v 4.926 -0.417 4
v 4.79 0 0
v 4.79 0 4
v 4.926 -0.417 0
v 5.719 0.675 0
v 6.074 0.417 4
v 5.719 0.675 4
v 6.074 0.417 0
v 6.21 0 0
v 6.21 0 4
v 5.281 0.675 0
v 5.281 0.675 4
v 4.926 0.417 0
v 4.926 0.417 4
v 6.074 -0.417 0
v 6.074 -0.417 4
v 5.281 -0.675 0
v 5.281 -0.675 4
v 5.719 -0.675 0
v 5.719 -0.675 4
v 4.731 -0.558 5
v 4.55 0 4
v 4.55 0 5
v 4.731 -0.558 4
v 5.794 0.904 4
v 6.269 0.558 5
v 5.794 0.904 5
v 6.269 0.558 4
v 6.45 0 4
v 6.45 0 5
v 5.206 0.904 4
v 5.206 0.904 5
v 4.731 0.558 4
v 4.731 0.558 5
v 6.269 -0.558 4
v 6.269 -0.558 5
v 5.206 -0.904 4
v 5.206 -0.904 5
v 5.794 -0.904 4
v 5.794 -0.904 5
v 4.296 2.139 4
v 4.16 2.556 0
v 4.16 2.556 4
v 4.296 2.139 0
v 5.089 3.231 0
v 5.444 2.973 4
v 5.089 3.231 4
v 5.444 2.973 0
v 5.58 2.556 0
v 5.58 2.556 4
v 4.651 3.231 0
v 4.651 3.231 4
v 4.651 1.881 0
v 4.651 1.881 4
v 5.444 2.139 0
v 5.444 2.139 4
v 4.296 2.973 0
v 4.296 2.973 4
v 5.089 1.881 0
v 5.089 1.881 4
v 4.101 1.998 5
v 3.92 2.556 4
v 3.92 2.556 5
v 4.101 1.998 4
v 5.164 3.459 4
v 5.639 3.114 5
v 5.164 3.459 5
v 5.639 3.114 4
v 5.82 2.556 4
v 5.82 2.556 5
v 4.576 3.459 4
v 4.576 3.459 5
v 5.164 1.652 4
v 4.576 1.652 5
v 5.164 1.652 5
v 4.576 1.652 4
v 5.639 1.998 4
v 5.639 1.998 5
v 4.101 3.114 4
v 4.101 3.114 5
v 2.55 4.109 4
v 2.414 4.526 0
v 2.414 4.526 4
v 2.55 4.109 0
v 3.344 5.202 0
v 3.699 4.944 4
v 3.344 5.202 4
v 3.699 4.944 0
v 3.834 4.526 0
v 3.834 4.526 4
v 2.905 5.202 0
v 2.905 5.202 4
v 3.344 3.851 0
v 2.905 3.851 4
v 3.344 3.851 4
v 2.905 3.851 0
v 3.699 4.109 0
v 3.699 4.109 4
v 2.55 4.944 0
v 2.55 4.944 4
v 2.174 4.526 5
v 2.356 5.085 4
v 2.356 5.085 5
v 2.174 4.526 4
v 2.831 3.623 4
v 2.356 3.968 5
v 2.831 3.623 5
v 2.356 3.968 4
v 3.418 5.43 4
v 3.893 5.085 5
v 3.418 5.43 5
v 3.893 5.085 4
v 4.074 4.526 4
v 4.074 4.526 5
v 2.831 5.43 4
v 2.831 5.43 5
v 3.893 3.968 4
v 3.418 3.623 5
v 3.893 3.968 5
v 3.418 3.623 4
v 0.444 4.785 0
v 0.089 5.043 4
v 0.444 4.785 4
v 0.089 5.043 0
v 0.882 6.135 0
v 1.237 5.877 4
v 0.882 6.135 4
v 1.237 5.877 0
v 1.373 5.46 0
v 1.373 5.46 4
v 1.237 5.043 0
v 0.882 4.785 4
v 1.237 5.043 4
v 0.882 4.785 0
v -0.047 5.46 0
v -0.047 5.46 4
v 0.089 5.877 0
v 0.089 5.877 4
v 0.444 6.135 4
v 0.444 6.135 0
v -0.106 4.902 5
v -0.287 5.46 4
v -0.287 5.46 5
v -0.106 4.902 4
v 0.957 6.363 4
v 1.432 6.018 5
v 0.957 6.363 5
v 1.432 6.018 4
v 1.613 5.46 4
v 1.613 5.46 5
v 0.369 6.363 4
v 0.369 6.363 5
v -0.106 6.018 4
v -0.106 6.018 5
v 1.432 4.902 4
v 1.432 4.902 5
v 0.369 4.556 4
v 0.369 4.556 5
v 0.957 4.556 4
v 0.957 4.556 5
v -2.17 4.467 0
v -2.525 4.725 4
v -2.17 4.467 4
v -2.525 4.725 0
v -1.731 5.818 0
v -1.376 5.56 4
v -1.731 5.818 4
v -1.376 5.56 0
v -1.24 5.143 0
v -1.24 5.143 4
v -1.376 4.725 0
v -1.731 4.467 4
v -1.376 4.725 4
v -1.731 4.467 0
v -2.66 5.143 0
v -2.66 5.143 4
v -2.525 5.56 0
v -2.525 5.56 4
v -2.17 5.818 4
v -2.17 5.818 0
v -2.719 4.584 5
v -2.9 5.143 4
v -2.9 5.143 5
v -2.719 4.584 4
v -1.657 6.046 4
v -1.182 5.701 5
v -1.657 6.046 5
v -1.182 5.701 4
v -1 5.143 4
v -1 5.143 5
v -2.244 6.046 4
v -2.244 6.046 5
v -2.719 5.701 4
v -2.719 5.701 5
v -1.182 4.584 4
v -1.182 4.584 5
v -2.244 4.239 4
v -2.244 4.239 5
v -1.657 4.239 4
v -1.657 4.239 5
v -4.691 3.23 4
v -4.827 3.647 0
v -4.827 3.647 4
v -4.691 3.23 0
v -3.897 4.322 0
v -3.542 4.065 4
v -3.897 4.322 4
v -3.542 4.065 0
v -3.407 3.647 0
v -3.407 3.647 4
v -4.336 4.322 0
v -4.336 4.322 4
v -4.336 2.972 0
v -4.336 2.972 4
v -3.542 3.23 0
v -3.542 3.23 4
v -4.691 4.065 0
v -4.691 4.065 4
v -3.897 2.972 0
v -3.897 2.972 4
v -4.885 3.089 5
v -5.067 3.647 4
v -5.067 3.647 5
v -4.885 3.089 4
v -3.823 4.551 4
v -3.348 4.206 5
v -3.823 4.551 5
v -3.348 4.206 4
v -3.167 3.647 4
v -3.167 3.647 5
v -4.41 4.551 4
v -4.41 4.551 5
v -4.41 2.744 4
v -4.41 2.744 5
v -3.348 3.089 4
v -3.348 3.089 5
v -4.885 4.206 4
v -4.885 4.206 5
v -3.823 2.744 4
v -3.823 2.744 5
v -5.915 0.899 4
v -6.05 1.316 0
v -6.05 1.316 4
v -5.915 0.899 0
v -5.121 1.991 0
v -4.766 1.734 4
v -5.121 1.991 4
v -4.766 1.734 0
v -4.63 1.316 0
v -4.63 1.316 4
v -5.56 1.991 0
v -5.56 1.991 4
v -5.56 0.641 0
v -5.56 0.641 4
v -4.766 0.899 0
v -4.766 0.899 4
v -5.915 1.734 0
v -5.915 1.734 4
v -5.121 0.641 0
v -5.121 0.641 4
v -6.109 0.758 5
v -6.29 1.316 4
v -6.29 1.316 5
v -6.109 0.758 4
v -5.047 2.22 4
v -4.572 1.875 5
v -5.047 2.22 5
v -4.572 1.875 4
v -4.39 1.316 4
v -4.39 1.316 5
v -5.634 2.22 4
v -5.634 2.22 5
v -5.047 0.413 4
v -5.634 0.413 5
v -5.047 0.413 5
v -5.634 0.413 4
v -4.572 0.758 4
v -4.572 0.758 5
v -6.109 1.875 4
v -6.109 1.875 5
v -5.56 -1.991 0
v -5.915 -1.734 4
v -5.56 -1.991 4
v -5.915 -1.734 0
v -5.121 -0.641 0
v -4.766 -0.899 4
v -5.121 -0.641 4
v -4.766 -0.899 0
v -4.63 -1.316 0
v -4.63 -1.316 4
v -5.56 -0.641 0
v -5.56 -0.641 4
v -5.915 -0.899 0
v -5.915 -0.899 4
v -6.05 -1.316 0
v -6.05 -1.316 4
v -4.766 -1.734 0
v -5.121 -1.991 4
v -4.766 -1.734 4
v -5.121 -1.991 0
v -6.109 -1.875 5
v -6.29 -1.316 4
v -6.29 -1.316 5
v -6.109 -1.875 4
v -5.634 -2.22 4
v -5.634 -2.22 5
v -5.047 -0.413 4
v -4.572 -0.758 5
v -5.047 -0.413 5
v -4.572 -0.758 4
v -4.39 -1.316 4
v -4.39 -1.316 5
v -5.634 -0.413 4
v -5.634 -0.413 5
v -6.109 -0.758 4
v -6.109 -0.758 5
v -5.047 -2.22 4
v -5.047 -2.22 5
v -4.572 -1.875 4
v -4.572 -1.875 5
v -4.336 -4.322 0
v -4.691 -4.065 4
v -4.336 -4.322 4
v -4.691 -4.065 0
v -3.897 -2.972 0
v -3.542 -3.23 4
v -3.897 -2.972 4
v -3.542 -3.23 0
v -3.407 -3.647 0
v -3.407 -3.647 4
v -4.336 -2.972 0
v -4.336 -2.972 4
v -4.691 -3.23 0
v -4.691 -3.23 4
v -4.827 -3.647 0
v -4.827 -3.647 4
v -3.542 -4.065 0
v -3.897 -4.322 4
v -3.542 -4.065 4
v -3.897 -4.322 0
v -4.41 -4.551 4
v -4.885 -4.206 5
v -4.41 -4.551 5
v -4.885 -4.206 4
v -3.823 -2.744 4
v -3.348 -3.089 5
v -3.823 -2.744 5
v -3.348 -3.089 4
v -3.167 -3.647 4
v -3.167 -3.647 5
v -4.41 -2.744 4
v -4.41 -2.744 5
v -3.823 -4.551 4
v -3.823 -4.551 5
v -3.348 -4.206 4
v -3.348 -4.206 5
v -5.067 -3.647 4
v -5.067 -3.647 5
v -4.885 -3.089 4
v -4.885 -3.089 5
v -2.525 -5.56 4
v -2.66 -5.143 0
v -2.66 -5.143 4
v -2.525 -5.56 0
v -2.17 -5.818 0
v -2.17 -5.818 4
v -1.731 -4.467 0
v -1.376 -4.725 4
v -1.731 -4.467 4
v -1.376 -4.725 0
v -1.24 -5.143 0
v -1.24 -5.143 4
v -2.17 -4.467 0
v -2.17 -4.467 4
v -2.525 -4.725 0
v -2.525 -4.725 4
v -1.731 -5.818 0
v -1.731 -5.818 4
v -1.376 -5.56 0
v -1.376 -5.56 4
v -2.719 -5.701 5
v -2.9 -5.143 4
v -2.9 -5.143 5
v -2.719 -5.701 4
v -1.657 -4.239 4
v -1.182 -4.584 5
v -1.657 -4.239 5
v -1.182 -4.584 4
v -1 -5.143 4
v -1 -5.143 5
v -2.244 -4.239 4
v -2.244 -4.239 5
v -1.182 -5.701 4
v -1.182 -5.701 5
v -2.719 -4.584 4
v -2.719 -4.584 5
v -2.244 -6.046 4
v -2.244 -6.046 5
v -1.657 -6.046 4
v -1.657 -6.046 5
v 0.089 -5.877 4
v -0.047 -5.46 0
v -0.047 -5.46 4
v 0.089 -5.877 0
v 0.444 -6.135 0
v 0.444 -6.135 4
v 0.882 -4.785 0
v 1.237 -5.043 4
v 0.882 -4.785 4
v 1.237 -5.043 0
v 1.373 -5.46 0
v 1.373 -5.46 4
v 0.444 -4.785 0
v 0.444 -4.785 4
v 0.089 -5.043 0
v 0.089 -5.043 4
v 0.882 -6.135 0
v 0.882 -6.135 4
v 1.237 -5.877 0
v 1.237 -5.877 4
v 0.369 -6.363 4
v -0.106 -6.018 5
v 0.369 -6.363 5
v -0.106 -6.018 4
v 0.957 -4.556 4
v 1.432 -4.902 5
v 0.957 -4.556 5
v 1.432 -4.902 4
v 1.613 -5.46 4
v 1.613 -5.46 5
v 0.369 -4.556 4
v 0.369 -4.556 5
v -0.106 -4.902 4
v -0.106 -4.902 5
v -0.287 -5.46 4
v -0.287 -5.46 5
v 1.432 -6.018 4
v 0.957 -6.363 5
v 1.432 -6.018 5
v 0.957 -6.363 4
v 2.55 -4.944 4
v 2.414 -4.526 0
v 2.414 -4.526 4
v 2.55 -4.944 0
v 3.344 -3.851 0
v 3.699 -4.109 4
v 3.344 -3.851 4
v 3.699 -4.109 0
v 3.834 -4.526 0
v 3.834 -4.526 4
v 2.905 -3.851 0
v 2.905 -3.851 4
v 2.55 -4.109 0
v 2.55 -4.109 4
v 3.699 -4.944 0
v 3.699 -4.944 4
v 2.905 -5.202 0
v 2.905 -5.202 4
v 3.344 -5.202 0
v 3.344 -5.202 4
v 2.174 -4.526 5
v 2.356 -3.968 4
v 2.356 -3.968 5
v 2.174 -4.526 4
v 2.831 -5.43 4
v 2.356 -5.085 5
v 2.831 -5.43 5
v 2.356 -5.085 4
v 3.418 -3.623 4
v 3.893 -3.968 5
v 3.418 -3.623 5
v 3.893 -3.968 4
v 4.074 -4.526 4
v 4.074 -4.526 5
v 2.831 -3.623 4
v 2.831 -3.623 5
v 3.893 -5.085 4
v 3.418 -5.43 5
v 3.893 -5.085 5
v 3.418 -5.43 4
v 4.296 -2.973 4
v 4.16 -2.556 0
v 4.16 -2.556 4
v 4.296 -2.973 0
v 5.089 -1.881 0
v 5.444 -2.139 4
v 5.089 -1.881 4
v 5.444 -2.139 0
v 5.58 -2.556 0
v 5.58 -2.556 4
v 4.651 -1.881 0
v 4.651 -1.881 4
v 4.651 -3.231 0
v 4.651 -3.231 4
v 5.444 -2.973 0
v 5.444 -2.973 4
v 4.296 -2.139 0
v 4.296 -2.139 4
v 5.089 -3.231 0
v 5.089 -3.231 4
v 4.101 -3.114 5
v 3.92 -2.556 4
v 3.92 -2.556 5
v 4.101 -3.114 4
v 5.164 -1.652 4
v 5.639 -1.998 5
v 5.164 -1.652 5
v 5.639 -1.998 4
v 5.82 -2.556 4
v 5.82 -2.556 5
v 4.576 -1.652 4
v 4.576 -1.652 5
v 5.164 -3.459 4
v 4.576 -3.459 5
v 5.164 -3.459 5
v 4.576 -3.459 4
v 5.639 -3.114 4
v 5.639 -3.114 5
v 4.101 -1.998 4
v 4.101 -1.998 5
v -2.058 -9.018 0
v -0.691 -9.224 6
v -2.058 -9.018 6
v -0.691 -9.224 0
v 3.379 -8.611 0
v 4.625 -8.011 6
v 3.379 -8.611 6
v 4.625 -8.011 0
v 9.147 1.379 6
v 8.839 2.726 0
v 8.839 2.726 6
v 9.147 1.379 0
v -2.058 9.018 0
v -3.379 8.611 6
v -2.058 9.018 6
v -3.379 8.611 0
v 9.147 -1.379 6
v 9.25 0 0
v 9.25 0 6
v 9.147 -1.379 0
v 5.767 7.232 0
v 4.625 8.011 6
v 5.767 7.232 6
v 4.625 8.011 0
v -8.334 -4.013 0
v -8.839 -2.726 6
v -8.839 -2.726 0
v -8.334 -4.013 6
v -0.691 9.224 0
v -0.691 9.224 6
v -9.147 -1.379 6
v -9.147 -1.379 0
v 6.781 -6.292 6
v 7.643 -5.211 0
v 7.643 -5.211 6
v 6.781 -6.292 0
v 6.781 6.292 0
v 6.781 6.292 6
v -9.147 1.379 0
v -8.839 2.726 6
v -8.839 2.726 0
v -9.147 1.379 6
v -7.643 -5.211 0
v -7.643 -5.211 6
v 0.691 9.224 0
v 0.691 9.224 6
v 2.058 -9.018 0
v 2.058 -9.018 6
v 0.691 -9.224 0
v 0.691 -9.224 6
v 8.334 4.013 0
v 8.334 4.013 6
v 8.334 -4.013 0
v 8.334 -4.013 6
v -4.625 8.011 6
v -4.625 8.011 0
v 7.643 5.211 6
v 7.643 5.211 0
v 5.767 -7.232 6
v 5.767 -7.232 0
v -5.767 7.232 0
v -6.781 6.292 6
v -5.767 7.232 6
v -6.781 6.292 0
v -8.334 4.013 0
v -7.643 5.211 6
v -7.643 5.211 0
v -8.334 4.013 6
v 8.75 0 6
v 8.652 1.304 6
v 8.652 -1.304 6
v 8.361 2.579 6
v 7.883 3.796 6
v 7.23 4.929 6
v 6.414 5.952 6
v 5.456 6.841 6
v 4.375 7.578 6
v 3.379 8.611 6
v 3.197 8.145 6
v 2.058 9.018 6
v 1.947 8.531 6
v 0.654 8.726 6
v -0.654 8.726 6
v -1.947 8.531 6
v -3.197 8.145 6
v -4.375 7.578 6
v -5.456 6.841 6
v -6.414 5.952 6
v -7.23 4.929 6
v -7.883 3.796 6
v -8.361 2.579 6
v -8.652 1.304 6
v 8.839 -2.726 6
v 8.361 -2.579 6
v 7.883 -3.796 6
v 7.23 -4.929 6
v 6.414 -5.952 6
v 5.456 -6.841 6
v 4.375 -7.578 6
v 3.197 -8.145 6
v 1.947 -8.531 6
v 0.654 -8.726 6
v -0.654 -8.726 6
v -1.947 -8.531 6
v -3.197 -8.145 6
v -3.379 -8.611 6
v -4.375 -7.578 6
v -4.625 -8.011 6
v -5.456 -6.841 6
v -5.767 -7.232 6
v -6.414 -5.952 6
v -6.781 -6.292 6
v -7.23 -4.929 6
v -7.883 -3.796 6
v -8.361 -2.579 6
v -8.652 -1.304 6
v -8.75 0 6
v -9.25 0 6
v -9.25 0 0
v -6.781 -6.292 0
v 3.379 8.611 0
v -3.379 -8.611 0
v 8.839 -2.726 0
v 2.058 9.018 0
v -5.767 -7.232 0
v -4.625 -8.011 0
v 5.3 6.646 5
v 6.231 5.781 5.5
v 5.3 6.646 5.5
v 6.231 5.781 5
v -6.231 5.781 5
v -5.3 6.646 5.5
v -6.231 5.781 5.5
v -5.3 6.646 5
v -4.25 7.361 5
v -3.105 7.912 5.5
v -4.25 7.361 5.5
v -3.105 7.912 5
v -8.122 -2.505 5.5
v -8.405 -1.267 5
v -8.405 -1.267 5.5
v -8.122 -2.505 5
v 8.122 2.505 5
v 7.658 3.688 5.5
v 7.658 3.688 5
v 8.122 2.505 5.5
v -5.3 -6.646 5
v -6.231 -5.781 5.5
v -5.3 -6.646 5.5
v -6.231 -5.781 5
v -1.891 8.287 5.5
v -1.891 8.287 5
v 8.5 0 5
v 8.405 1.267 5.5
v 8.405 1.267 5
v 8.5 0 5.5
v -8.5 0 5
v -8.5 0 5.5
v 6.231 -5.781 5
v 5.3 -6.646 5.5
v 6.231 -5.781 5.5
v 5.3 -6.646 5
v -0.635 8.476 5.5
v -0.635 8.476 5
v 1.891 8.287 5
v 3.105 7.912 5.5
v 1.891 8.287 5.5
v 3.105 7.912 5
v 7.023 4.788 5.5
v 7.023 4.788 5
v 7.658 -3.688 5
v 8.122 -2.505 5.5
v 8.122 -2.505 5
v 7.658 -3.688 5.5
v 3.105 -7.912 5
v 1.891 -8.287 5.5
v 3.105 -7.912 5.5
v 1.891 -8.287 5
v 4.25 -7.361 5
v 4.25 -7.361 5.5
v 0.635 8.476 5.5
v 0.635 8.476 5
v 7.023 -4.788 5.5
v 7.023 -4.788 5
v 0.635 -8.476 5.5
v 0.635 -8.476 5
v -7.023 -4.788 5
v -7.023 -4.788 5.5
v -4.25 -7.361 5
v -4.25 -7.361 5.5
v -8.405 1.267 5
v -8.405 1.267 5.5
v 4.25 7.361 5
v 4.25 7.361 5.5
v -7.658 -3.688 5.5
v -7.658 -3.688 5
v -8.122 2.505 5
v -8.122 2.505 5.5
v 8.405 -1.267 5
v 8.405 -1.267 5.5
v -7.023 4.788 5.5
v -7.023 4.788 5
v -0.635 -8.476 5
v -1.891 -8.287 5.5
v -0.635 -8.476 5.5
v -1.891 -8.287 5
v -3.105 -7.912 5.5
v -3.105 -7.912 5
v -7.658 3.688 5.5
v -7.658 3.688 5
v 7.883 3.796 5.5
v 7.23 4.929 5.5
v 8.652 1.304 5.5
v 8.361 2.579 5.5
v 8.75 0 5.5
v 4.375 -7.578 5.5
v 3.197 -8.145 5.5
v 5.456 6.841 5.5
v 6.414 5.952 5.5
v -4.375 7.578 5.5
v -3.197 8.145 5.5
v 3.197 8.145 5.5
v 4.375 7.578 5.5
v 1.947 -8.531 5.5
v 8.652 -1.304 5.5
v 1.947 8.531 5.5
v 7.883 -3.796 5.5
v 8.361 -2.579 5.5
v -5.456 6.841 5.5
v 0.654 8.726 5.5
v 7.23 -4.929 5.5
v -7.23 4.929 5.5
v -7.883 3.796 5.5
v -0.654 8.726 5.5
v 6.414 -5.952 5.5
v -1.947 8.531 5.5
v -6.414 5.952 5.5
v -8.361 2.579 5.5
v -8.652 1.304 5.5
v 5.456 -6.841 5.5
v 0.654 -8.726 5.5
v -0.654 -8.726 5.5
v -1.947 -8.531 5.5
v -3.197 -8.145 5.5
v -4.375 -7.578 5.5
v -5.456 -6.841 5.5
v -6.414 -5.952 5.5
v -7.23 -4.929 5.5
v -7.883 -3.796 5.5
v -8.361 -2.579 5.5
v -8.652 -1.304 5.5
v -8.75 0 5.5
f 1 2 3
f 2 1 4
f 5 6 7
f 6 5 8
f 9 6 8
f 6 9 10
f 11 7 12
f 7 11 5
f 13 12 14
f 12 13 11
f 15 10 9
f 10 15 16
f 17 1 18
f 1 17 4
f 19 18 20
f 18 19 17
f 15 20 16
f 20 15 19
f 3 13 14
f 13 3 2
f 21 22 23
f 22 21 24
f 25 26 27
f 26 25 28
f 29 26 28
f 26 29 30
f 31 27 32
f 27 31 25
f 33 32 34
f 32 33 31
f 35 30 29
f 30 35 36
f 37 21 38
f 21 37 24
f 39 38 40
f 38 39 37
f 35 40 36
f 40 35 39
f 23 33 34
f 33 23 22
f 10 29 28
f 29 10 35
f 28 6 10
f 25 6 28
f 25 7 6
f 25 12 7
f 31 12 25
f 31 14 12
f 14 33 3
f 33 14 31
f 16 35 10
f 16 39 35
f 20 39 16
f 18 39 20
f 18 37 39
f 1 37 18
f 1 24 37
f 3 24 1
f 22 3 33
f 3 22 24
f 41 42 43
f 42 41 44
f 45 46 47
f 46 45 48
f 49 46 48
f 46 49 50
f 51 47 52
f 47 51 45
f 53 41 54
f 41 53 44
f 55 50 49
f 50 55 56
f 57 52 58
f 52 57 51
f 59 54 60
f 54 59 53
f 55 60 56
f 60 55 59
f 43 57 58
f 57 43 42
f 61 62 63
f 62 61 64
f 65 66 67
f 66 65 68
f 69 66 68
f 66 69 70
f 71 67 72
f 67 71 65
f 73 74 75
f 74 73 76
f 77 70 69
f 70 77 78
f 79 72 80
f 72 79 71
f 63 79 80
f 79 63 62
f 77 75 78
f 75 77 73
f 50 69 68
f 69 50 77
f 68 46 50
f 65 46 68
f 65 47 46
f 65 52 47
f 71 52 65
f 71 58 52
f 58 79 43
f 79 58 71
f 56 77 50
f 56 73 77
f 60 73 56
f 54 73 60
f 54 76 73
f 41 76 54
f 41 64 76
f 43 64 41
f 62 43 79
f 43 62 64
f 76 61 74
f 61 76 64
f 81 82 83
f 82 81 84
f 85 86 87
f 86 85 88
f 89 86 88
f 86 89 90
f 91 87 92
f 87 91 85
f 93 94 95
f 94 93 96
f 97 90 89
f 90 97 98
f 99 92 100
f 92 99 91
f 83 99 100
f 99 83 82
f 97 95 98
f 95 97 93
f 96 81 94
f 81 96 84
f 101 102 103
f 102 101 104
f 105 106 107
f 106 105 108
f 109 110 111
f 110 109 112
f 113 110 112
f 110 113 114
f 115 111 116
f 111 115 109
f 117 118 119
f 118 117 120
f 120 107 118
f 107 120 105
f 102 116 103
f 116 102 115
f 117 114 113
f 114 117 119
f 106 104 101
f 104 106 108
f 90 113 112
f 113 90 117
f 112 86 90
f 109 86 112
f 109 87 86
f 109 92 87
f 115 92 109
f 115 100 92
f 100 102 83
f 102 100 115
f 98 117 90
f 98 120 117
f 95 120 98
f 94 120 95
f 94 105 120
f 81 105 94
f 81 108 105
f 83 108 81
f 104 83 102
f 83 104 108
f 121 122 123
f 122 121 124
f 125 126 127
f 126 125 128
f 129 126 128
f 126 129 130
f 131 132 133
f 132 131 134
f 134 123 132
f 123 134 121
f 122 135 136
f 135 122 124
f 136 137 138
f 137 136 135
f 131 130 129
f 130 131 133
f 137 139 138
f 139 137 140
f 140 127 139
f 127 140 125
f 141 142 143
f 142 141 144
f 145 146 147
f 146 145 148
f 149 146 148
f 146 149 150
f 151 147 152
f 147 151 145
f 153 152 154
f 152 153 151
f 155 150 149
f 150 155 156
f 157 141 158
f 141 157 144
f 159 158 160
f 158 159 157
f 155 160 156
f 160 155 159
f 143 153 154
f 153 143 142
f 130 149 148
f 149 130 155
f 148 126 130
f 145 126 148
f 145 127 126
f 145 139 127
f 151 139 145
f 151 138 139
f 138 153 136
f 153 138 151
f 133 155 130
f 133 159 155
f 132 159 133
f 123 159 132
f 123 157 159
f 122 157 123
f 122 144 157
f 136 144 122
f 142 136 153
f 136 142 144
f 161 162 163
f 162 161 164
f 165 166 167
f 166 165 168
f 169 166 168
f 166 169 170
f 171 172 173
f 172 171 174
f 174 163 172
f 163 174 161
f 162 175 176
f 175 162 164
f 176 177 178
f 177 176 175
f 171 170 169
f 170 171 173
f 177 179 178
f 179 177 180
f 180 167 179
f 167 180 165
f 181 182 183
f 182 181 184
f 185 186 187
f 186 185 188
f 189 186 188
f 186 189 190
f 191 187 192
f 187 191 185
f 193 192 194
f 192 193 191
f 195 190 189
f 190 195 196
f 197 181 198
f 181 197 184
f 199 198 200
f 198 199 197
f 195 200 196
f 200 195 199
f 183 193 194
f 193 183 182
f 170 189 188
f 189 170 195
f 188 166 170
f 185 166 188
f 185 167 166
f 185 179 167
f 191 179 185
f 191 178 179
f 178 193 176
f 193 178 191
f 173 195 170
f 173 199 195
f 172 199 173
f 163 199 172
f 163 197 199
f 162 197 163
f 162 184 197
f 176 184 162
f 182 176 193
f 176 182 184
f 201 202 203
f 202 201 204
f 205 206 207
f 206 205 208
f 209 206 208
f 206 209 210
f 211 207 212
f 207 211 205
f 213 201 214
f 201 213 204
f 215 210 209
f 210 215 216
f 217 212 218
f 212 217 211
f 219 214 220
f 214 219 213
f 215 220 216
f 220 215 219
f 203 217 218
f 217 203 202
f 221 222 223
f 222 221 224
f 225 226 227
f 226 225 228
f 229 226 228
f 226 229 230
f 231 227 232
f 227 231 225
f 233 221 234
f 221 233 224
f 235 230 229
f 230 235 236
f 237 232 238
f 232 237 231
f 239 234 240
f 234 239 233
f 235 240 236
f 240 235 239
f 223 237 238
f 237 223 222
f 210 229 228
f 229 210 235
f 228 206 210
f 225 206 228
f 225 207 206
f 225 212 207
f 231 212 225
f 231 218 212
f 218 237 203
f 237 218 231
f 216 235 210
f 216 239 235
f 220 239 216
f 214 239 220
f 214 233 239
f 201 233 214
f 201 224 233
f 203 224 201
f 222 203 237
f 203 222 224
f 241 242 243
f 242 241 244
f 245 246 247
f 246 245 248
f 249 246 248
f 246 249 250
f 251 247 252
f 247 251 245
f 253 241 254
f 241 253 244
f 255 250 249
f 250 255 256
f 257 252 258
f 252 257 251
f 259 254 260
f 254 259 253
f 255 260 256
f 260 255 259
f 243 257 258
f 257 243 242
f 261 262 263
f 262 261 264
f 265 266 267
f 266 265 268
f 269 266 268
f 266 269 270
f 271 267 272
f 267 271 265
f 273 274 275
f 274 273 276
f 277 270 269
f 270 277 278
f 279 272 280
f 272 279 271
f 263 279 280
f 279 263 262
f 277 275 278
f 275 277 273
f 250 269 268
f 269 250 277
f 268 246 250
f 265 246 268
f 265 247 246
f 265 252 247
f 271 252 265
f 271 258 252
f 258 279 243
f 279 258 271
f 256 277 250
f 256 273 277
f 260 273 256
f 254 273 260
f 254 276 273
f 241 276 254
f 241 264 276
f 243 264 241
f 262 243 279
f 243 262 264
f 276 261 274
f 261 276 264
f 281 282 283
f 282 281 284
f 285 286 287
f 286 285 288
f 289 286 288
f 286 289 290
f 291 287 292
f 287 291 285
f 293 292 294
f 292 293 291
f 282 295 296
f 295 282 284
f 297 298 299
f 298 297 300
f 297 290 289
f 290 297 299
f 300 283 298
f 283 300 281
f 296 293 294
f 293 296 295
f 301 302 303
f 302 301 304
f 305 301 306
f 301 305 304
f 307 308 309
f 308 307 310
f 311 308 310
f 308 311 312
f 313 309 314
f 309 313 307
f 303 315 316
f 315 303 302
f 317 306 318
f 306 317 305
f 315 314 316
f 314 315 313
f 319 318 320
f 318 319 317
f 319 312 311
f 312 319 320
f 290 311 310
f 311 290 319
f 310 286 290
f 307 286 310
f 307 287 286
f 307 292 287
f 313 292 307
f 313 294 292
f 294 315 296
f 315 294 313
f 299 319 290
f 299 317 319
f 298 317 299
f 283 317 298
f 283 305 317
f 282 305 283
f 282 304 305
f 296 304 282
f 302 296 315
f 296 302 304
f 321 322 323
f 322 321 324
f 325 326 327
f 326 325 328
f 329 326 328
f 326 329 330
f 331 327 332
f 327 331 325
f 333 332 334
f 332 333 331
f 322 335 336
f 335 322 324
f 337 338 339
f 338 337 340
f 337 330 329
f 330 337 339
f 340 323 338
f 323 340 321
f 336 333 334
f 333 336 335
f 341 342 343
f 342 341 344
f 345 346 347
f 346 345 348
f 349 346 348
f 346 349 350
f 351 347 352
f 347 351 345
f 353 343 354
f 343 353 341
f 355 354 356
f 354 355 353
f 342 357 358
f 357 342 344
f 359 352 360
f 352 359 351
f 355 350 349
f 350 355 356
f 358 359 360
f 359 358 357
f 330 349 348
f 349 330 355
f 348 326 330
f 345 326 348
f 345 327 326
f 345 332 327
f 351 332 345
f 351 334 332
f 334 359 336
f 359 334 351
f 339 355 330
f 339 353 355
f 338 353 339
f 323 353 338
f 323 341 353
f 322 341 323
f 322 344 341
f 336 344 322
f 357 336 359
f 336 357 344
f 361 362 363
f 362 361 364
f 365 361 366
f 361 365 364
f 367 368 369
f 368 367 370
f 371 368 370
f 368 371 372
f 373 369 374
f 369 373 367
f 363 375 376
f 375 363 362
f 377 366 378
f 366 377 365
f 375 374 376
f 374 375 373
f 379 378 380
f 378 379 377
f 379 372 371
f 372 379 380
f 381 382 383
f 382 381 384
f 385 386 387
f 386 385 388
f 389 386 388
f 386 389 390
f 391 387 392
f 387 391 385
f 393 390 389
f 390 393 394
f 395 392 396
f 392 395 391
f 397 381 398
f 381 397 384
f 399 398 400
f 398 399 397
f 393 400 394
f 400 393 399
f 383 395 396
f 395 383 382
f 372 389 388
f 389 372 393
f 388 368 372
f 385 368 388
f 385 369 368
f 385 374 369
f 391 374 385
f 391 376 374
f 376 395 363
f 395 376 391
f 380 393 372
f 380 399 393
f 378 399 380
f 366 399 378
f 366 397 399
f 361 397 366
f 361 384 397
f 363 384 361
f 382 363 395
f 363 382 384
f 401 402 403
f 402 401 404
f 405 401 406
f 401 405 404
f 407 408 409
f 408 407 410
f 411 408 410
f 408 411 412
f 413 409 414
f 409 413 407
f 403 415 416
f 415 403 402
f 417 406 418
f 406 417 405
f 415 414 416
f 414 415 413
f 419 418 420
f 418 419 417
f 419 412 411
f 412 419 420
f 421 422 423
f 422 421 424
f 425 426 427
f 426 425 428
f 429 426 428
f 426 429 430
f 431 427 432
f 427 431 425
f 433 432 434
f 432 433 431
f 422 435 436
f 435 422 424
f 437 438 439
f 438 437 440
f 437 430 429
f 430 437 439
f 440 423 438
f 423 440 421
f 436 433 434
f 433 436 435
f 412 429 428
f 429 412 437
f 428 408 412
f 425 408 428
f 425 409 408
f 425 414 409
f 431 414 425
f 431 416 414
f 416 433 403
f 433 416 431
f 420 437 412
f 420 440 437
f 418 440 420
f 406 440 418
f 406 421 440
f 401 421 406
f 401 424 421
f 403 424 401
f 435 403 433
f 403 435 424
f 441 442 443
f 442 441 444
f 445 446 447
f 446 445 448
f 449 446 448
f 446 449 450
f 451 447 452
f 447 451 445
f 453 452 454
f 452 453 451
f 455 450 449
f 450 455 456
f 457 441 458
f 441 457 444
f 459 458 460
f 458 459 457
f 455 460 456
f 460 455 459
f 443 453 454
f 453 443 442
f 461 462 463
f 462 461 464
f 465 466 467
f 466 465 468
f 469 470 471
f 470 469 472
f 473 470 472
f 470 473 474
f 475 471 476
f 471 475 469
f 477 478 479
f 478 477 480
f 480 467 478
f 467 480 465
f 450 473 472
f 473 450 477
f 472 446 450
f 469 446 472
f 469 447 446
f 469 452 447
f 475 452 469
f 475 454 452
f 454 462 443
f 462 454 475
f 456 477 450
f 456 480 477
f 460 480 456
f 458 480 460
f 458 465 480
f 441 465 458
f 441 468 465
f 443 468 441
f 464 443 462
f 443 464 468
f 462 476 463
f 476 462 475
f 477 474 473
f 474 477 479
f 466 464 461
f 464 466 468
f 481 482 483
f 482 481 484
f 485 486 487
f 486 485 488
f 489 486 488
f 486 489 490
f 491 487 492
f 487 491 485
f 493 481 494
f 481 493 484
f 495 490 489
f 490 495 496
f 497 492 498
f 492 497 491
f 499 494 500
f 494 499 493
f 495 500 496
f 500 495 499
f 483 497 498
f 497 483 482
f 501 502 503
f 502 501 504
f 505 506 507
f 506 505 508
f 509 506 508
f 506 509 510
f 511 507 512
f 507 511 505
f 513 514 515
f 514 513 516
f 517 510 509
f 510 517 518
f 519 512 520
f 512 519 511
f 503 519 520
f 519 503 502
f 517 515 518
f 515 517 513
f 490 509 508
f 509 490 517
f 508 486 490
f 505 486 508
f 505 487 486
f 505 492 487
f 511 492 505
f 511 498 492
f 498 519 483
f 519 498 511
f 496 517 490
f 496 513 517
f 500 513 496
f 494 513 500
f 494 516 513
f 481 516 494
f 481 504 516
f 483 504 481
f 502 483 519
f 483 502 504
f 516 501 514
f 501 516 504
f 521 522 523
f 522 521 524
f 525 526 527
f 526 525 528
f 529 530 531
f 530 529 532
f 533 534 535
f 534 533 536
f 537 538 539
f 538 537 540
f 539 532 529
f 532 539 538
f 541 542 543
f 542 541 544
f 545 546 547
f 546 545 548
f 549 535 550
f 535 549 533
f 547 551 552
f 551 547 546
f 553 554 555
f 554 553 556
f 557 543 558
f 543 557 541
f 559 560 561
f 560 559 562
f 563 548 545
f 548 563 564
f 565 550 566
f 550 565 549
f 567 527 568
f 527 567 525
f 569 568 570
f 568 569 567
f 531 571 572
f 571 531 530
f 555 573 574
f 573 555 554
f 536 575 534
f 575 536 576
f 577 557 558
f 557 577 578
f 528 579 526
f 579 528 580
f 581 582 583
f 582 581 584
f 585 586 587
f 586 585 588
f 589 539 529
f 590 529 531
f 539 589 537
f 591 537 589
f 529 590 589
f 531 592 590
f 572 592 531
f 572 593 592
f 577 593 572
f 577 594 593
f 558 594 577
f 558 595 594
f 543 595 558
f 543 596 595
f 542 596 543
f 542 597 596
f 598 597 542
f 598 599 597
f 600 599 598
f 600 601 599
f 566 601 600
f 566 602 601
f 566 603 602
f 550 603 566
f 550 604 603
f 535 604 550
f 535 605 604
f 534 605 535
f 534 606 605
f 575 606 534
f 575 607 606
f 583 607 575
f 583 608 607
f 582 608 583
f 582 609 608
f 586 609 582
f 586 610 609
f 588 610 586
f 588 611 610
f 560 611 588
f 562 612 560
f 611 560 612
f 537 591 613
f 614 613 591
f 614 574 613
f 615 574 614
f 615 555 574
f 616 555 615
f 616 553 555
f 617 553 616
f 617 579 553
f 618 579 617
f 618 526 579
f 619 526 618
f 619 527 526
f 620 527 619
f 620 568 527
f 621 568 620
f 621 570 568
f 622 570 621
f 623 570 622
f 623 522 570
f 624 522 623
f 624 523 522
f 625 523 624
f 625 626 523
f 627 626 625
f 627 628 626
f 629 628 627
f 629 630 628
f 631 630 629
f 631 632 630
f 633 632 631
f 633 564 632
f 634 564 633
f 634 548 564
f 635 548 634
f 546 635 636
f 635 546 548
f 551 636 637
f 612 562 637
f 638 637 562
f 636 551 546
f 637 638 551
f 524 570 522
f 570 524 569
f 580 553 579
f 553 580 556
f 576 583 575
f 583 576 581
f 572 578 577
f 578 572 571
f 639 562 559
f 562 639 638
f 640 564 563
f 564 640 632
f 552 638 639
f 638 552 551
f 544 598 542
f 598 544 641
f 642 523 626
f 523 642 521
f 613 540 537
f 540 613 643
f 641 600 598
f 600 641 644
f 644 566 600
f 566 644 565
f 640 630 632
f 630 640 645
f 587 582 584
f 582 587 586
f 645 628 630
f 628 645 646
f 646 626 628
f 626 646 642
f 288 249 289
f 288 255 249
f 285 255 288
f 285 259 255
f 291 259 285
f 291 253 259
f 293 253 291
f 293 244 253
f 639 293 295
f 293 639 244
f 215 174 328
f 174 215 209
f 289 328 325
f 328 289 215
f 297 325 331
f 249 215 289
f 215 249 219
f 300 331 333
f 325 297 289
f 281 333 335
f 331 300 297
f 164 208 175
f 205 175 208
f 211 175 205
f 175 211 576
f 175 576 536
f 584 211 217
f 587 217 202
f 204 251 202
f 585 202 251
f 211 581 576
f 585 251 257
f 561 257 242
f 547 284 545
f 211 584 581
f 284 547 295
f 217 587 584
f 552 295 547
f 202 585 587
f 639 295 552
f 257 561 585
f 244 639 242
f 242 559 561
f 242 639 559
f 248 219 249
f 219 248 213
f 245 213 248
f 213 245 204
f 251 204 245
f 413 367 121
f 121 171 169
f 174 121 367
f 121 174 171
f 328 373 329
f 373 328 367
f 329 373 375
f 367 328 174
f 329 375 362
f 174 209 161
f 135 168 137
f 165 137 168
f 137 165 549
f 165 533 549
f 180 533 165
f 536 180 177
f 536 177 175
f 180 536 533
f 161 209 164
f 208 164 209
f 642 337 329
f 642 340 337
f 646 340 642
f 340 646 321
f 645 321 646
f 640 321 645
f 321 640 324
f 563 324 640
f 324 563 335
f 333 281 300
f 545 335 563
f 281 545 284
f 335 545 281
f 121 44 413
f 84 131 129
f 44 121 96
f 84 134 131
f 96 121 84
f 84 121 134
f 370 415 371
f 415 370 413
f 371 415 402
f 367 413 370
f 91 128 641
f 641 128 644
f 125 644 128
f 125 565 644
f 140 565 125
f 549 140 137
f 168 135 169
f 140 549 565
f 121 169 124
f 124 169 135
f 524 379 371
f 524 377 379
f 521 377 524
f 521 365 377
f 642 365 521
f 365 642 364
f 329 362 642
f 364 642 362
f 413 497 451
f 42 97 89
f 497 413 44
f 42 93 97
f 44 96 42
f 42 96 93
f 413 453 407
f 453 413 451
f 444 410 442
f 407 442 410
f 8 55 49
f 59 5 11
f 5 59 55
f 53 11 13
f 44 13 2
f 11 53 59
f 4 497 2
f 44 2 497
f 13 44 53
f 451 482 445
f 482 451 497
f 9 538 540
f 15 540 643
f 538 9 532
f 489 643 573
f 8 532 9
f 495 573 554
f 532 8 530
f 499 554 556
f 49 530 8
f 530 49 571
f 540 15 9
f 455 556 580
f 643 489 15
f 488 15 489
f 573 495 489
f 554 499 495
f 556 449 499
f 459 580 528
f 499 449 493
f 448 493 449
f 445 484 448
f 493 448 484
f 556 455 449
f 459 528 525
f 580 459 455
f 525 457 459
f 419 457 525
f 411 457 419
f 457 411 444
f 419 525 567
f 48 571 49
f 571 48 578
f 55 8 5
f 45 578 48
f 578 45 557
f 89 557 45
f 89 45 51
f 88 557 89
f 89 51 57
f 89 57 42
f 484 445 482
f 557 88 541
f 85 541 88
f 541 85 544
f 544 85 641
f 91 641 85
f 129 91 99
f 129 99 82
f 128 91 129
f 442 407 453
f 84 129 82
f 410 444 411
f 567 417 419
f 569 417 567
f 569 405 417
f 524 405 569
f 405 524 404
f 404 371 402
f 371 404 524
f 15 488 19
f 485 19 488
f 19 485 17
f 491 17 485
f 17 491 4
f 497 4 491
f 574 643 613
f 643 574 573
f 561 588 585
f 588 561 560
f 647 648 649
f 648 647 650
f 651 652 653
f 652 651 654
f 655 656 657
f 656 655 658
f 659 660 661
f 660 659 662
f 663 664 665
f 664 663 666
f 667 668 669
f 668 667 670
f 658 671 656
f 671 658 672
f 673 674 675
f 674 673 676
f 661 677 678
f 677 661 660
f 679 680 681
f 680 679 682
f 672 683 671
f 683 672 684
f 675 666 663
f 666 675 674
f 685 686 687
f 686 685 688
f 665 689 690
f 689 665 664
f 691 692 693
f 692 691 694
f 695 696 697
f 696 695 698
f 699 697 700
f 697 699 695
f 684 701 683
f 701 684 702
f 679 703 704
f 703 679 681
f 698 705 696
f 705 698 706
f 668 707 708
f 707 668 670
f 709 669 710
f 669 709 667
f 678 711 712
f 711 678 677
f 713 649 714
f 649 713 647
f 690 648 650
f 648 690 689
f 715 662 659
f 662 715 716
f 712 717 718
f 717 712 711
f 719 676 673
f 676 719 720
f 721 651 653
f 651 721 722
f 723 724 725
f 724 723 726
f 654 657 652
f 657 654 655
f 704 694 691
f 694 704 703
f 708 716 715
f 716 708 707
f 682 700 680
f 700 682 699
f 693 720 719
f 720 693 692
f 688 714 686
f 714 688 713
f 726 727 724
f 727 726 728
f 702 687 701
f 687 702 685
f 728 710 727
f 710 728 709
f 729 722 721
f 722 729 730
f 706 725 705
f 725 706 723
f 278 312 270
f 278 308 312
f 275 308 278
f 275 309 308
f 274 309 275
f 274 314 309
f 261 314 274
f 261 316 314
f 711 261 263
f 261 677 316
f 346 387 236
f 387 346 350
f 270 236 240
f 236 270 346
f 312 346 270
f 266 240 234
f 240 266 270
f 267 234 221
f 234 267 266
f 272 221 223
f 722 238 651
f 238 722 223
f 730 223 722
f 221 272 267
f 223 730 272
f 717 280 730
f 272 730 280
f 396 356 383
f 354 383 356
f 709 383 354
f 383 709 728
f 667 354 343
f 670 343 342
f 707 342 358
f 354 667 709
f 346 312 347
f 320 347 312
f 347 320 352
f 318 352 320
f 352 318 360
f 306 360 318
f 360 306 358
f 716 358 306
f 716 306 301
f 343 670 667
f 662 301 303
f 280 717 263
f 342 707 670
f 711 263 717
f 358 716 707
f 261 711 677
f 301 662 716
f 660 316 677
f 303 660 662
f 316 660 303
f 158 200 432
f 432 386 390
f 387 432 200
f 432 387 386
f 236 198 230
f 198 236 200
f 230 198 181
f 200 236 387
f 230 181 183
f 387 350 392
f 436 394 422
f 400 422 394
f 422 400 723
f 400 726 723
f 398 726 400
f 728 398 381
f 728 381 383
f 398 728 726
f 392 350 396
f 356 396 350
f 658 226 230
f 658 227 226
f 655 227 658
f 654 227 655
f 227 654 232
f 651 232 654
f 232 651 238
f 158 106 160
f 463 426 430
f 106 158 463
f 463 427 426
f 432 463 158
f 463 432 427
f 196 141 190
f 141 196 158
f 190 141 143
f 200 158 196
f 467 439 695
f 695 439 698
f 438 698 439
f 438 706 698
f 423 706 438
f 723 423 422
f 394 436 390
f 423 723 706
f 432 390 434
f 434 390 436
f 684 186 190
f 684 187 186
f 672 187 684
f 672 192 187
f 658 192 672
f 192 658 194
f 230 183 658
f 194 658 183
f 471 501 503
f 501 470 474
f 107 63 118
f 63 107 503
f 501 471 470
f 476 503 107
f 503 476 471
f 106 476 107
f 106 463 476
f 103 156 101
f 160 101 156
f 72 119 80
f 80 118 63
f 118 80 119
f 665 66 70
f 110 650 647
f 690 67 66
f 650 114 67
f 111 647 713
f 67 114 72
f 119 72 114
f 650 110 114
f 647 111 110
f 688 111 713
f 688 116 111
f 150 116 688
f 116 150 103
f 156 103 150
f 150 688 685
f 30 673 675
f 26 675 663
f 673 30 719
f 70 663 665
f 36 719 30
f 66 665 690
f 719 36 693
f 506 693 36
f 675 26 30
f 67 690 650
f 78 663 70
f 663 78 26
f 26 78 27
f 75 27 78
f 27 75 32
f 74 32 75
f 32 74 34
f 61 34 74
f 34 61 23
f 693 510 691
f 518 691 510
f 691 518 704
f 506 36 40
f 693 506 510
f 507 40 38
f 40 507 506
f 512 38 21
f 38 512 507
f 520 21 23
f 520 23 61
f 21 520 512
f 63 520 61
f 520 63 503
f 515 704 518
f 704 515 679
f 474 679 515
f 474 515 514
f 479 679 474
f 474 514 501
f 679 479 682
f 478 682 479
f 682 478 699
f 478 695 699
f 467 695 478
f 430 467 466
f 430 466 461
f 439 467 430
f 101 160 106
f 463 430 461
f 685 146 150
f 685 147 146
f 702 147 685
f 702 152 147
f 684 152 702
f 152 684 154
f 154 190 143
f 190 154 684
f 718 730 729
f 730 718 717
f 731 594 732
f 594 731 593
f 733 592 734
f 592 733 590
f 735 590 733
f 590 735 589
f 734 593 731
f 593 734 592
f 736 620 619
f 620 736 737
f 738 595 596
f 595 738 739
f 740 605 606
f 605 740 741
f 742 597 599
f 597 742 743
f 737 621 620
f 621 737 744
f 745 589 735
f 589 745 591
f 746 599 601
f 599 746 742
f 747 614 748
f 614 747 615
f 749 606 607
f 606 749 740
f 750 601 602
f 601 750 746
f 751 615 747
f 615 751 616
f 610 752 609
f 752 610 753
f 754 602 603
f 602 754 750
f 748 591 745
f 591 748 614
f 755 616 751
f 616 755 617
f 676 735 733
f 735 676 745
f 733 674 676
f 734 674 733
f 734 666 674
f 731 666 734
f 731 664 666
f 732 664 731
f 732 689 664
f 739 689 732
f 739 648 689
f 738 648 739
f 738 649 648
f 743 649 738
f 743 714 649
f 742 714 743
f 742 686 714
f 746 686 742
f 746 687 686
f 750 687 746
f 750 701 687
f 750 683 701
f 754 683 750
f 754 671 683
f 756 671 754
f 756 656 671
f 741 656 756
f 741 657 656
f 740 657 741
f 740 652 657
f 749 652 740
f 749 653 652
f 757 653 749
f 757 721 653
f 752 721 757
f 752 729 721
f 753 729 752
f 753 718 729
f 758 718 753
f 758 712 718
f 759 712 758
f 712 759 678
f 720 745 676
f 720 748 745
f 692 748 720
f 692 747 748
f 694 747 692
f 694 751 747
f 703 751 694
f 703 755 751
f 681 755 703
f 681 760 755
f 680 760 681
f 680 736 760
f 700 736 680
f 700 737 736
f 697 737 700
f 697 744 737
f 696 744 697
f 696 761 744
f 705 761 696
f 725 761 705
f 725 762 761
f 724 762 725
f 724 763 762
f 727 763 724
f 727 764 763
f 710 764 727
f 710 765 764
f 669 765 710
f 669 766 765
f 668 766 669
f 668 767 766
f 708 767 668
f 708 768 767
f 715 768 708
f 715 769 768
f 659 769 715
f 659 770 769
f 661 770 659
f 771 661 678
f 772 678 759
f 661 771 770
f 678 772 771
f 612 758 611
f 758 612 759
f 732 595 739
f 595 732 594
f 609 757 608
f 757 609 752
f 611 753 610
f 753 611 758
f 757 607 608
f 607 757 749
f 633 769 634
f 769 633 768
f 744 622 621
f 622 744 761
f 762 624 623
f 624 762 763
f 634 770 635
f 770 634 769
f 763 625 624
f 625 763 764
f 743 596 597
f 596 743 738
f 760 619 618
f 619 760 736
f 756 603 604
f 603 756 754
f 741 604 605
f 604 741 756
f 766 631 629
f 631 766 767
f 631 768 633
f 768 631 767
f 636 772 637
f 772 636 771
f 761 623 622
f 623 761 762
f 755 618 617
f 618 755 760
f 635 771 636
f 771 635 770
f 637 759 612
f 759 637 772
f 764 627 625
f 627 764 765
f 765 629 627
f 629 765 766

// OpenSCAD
//
// This model is licensed under a
// Creative Commons Attribution-ShareAlike 4.0 International License.
// 
// You should have received a copy of the license along with this
// work. If not, see <http://creativecommons.org/licenses/by-sa/4.0/>.
//

in14spacer();

// IN-14 nixie tube spacer. Compatible with machined DIP or wire wrap
// terminals to make a nixie tube socket.
//
// height - spacer height between board and tube
// lip    - height of lip around edge

module in14spacer(height = 5, lip = 1) {
    pr1 = 1.9/2;  // 1.83 with wiggle room
    pr2 = 1.42/2; // 1.35 with wiggle room
    $fn = 42;

    difference() {
        color("grey") cylinder(h = height+lip, r = 9.25);
        
        // carve out the lip
        translate([0,0,height]) cylinder(h = lip/2+0.1, r = 8.5);
        translate([0,0,height+lip/2]) cylinder(h = lip+0.1, r = 8.75);
        
        for (i = [0:13]) {
            $fn = 10;
            cx = 5.5 * cos(360/13 * i);
            cy = 5.5 * sin(360/13 * i);

            color("green") translate([cx, cy, -1]) cylinder(h = height+2, r = pr2);
            color("purple") translate([cx, cy, height-1]) cylinder(h = 1.1, r = pr1);
        }
    }
}
